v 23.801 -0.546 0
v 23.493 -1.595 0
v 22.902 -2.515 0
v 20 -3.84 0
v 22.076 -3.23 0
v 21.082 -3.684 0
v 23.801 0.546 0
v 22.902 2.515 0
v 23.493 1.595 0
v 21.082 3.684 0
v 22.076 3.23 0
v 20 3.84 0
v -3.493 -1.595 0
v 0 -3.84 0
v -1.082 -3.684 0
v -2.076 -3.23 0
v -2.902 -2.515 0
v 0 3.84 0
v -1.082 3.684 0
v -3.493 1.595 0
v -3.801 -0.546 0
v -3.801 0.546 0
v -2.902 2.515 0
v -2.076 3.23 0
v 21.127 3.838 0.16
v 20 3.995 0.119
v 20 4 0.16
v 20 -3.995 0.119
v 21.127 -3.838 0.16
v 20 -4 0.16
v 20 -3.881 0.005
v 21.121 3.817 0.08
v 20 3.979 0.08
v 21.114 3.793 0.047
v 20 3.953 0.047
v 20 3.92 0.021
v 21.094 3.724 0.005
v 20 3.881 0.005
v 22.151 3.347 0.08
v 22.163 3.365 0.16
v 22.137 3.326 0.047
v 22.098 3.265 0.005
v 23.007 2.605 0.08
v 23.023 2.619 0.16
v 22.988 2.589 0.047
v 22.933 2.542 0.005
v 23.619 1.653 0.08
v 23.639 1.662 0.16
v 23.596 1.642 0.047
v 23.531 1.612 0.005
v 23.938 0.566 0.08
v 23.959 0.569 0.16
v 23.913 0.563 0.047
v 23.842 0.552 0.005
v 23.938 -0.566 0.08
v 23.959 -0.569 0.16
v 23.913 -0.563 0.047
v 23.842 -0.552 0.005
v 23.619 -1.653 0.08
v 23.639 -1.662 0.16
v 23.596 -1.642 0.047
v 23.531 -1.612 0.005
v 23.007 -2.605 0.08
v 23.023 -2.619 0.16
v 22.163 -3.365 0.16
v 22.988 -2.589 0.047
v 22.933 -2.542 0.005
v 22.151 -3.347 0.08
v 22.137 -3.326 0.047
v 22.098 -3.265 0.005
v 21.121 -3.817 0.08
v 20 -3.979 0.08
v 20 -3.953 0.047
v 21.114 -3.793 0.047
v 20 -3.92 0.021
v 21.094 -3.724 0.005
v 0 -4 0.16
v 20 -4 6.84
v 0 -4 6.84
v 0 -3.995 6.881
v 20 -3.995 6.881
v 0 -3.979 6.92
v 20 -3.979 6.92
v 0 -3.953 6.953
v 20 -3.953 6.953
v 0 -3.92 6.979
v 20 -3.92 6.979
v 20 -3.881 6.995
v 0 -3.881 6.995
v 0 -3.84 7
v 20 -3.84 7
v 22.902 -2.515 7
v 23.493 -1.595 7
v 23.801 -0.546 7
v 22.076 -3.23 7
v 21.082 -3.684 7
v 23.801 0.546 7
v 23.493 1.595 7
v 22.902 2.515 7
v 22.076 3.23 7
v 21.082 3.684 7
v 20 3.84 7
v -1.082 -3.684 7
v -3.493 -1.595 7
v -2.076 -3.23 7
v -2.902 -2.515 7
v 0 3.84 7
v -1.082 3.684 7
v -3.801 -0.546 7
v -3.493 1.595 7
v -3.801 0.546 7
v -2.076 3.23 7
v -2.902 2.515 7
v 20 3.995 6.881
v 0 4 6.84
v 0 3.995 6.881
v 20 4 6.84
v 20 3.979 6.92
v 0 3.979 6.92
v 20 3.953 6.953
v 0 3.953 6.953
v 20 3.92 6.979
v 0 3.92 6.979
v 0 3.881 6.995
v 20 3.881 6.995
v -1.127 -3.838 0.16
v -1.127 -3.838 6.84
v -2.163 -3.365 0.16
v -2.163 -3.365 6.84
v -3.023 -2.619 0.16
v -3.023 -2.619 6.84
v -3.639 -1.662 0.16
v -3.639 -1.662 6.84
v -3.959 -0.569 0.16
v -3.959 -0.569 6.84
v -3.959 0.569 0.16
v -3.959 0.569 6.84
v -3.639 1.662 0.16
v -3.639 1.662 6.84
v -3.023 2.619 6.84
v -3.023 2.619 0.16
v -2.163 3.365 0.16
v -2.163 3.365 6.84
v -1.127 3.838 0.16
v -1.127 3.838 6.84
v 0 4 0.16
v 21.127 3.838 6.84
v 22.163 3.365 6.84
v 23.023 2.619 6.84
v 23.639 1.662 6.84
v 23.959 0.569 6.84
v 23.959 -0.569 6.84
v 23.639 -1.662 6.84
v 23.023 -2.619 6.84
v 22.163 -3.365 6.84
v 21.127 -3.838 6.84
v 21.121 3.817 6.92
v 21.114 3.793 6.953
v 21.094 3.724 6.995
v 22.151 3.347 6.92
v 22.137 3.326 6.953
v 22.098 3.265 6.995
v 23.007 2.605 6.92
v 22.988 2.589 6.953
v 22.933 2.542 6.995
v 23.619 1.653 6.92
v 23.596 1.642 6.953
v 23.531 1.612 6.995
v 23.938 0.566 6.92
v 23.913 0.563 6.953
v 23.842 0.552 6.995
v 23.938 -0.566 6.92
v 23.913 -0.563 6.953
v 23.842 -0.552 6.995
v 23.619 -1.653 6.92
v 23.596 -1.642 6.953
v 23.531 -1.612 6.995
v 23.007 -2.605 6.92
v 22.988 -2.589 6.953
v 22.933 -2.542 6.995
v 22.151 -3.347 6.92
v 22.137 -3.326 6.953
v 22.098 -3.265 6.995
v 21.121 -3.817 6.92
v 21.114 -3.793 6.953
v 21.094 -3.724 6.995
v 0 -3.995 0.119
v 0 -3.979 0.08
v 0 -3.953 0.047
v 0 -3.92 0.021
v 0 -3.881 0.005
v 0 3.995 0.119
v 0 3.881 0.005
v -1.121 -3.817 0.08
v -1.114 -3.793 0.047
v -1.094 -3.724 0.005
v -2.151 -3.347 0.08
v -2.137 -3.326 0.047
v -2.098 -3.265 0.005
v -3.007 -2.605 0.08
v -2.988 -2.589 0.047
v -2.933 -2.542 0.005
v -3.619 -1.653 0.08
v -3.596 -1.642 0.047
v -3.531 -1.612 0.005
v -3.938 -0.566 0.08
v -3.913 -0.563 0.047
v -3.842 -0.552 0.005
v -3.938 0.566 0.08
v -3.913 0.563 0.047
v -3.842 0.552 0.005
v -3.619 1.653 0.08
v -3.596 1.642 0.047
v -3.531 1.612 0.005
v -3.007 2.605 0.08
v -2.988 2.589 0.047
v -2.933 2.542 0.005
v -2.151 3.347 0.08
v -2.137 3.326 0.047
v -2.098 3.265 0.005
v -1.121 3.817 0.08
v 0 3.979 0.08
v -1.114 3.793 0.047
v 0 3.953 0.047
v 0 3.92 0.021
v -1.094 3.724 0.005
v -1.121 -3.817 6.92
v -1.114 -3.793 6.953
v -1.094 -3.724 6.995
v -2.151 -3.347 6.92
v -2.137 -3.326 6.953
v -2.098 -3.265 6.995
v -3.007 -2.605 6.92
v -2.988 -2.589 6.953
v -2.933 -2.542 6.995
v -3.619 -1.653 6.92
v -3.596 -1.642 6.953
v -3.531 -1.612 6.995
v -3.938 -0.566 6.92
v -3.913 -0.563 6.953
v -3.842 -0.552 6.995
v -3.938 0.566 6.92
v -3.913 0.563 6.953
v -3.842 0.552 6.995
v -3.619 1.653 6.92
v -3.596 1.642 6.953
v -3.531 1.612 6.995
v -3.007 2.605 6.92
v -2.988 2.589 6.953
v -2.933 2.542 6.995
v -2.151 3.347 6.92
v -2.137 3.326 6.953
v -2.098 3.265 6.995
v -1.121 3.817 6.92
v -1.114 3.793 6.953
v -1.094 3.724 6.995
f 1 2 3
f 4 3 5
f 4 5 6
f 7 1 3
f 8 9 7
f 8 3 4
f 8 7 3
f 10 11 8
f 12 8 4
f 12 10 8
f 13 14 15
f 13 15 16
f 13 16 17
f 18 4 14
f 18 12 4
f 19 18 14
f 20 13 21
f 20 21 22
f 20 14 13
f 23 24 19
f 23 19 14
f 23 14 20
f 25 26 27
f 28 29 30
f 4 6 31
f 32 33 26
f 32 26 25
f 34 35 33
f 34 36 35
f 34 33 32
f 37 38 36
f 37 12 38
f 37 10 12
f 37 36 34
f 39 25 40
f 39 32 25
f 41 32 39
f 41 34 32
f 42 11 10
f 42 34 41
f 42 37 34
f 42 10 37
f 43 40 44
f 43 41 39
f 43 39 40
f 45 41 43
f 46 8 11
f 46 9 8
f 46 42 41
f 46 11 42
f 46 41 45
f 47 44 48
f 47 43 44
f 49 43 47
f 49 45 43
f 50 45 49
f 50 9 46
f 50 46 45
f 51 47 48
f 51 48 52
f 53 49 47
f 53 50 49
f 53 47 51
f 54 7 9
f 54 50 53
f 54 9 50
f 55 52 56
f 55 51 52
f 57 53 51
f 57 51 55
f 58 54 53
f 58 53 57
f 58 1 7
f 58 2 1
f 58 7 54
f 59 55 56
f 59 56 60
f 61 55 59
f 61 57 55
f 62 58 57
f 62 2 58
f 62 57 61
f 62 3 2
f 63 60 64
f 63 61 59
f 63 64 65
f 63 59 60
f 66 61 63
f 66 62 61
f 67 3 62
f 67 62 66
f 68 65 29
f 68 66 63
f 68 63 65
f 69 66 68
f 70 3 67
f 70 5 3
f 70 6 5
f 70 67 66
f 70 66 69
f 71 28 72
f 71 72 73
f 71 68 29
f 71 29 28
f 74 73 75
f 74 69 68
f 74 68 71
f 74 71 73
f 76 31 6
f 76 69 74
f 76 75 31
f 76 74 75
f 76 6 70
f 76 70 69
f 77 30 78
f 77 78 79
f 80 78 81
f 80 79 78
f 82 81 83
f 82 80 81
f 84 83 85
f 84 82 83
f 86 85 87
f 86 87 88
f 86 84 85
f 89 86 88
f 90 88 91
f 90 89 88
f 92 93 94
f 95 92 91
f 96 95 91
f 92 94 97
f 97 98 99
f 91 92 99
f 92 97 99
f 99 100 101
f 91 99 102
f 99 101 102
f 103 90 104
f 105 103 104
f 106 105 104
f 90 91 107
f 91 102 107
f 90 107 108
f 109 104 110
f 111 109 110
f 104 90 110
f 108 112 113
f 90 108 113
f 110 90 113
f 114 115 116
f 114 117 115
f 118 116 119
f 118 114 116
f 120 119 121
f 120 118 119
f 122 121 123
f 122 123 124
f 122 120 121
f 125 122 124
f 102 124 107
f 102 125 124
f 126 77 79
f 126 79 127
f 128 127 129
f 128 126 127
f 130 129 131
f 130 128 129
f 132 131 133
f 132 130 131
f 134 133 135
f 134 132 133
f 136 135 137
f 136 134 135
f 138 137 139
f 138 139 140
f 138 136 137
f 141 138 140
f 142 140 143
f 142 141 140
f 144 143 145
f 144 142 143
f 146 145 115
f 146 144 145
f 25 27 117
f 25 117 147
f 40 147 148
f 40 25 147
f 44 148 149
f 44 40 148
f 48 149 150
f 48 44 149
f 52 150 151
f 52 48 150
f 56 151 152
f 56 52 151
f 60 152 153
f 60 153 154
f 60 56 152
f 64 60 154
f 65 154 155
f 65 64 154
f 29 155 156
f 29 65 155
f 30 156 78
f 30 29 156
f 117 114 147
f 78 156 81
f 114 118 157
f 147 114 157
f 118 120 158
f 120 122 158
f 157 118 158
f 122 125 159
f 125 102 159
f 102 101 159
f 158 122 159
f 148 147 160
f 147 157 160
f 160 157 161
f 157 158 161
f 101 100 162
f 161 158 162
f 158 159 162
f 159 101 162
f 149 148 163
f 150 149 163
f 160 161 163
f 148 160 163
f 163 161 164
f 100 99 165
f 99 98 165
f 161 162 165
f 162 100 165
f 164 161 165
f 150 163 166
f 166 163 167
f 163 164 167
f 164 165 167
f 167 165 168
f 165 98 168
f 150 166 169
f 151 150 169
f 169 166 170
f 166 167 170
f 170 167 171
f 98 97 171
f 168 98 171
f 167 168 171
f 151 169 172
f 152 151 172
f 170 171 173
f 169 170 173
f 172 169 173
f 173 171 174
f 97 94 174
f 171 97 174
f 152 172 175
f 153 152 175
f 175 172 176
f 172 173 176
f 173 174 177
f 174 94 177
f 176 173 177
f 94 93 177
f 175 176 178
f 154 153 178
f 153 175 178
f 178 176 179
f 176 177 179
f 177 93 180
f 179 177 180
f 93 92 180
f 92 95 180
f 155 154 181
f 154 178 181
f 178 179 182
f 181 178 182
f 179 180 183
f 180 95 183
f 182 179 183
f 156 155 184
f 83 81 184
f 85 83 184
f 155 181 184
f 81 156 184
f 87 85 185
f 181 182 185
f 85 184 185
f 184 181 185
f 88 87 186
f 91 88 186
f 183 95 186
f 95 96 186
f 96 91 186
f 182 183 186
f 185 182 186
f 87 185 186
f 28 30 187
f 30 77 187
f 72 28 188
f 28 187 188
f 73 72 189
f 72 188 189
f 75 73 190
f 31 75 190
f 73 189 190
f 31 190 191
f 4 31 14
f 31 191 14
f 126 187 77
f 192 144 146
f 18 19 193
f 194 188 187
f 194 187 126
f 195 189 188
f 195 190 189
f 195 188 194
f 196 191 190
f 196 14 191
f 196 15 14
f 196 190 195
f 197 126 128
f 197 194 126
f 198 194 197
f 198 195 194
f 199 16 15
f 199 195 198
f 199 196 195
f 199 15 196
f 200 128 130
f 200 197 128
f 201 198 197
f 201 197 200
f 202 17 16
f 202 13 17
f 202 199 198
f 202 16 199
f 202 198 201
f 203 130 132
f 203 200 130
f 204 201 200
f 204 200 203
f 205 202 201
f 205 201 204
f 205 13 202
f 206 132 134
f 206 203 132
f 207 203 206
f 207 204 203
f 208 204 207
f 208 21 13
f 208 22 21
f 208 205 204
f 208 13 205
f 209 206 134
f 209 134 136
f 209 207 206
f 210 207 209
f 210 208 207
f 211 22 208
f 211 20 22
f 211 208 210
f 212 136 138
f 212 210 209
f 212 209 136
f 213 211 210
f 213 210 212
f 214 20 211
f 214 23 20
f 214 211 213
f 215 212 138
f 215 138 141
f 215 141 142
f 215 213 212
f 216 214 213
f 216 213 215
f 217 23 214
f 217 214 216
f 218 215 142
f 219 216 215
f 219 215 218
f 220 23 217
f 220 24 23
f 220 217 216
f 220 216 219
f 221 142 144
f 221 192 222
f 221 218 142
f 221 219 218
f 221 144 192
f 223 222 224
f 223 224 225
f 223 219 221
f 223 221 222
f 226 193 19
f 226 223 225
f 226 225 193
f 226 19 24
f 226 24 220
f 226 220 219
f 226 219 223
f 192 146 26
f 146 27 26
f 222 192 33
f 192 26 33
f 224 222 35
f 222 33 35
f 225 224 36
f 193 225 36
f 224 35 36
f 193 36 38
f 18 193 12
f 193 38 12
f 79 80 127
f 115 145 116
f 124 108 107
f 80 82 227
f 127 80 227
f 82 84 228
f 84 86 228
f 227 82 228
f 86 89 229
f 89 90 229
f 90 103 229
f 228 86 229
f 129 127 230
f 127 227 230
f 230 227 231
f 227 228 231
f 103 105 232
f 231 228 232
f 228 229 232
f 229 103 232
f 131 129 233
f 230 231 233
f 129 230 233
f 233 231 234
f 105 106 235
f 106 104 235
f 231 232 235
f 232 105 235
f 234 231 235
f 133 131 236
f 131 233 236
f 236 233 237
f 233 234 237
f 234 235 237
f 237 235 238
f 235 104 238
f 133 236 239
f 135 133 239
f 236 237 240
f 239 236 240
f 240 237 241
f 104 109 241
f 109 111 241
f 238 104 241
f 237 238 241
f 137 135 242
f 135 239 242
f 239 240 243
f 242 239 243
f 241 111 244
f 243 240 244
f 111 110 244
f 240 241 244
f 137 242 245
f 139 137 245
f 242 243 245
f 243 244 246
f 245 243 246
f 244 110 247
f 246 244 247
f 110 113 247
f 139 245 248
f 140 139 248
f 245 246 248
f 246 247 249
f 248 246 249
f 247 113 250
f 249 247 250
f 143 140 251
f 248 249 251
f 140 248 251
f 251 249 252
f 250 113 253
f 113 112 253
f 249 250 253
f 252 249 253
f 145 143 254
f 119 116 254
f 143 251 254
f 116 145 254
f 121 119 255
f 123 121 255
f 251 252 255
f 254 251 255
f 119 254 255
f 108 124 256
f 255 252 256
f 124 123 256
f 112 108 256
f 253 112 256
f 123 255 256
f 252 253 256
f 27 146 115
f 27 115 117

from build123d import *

# Parameters (mm, degrees)
EXTRUDE_1_DEPTH = 7
FILLET_1_R      = 0.16


with BuildPart() as part:
    # Эскиз1 → Бобышка-Вытянуть1 (new body)
    with BuildSketch(Plane.XY):
        with BuildLine():
            Line((0, 4), (20, 4))
            ThreePointArc((20, 4), (24, 0), (20, -4))
            Line((20, -4), (0, -4))
            ThreePointArc((0, -4), (-4, 0), (0, 4))
        make_face()
    extrude(amount=EXTRUDE_1_DEPTH)

    # Скругление1
    fillet_1_edges = [part.edges().sort_by_distance(p)[0] for p in [
        (24, 0, 7),
        (10, 4, 7),
        (-4, 0, 7),
        (10, 4, 0),
        (24, 0, 0),
        (10, -4, 0),
        (-4, 0, 0),
        (10, -4, 7),
    ]]
    fillet(fillet_1_edges, radius=FILLET_1_R)


solid = part.part
